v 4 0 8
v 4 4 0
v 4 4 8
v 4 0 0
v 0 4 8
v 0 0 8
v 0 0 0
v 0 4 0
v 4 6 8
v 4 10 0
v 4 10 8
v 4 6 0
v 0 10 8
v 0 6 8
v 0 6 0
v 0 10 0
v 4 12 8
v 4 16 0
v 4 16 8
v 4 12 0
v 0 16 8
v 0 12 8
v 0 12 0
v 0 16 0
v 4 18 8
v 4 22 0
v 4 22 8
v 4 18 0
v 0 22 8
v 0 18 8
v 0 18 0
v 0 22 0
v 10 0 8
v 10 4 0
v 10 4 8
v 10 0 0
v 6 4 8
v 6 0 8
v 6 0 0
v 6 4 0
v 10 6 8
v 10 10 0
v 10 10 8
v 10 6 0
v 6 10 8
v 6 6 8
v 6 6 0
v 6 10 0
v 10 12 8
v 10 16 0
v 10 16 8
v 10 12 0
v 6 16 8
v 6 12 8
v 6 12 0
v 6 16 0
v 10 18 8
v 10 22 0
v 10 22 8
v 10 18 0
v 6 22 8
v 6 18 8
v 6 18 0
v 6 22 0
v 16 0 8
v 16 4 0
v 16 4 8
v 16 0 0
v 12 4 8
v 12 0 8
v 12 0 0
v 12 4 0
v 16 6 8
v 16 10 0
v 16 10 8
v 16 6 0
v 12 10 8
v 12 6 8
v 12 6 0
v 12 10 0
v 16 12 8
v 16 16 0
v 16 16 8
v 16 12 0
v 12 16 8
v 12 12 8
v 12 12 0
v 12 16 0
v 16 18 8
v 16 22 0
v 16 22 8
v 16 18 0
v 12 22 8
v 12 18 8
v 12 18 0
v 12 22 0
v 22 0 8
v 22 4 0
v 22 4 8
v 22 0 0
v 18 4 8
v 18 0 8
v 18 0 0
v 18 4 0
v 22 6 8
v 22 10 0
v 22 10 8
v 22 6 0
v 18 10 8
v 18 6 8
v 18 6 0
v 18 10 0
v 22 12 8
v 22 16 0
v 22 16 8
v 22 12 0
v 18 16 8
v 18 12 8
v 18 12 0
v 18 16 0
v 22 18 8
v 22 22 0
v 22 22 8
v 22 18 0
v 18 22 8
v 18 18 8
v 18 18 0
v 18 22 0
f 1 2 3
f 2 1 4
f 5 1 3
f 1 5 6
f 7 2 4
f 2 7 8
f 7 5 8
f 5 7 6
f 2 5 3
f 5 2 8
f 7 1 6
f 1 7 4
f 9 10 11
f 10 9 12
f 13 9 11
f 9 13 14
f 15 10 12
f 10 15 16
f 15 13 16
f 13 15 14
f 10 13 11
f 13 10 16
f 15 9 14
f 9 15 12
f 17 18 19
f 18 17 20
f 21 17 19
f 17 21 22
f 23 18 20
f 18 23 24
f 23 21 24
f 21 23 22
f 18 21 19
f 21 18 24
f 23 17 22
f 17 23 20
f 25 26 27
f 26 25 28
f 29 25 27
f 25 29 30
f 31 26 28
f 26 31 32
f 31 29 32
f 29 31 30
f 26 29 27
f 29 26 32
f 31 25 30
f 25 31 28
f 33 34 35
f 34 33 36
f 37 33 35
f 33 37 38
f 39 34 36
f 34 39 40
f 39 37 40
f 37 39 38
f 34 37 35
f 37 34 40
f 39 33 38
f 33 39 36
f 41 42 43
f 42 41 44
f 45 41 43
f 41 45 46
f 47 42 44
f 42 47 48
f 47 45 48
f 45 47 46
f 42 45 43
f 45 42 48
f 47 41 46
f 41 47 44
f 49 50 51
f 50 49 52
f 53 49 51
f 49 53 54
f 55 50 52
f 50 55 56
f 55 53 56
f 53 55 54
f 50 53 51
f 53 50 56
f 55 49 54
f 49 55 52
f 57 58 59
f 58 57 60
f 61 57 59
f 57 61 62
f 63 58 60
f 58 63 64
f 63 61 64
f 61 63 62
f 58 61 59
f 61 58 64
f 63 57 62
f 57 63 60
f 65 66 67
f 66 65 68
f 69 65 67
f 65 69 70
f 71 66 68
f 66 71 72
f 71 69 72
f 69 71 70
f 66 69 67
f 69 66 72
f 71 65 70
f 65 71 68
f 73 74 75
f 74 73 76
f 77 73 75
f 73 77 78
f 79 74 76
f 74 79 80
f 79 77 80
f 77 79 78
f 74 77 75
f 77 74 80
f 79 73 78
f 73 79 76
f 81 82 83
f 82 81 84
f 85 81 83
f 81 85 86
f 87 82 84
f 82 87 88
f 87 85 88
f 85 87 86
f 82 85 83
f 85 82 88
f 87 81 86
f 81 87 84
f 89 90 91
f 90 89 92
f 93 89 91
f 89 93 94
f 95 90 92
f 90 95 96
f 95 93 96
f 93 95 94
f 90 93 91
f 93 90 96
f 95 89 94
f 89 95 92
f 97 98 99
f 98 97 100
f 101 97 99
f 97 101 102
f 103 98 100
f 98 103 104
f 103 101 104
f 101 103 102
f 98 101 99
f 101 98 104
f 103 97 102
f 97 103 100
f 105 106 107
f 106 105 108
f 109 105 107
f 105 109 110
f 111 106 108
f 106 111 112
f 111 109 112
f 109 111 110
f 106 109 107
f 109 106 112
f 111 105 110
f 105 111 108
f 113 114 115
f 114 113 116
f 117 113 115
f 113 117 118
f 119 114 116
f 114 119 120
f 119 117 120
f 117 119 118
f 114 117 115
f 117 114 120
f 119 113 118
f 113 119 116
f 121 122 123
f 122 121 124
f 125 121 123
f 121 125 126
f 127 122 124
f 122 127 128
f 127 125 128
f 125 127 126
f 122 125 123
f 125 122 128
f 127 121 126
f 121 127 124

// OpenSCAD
// Construct: nested for-loops tiling a grid of pillars.
for (x = [0 : 3]) {
    for (y = [0 : 3]) {
        translate([x * 6, y * 6, 0]) cube([4, 4, 8]);
    }
}
